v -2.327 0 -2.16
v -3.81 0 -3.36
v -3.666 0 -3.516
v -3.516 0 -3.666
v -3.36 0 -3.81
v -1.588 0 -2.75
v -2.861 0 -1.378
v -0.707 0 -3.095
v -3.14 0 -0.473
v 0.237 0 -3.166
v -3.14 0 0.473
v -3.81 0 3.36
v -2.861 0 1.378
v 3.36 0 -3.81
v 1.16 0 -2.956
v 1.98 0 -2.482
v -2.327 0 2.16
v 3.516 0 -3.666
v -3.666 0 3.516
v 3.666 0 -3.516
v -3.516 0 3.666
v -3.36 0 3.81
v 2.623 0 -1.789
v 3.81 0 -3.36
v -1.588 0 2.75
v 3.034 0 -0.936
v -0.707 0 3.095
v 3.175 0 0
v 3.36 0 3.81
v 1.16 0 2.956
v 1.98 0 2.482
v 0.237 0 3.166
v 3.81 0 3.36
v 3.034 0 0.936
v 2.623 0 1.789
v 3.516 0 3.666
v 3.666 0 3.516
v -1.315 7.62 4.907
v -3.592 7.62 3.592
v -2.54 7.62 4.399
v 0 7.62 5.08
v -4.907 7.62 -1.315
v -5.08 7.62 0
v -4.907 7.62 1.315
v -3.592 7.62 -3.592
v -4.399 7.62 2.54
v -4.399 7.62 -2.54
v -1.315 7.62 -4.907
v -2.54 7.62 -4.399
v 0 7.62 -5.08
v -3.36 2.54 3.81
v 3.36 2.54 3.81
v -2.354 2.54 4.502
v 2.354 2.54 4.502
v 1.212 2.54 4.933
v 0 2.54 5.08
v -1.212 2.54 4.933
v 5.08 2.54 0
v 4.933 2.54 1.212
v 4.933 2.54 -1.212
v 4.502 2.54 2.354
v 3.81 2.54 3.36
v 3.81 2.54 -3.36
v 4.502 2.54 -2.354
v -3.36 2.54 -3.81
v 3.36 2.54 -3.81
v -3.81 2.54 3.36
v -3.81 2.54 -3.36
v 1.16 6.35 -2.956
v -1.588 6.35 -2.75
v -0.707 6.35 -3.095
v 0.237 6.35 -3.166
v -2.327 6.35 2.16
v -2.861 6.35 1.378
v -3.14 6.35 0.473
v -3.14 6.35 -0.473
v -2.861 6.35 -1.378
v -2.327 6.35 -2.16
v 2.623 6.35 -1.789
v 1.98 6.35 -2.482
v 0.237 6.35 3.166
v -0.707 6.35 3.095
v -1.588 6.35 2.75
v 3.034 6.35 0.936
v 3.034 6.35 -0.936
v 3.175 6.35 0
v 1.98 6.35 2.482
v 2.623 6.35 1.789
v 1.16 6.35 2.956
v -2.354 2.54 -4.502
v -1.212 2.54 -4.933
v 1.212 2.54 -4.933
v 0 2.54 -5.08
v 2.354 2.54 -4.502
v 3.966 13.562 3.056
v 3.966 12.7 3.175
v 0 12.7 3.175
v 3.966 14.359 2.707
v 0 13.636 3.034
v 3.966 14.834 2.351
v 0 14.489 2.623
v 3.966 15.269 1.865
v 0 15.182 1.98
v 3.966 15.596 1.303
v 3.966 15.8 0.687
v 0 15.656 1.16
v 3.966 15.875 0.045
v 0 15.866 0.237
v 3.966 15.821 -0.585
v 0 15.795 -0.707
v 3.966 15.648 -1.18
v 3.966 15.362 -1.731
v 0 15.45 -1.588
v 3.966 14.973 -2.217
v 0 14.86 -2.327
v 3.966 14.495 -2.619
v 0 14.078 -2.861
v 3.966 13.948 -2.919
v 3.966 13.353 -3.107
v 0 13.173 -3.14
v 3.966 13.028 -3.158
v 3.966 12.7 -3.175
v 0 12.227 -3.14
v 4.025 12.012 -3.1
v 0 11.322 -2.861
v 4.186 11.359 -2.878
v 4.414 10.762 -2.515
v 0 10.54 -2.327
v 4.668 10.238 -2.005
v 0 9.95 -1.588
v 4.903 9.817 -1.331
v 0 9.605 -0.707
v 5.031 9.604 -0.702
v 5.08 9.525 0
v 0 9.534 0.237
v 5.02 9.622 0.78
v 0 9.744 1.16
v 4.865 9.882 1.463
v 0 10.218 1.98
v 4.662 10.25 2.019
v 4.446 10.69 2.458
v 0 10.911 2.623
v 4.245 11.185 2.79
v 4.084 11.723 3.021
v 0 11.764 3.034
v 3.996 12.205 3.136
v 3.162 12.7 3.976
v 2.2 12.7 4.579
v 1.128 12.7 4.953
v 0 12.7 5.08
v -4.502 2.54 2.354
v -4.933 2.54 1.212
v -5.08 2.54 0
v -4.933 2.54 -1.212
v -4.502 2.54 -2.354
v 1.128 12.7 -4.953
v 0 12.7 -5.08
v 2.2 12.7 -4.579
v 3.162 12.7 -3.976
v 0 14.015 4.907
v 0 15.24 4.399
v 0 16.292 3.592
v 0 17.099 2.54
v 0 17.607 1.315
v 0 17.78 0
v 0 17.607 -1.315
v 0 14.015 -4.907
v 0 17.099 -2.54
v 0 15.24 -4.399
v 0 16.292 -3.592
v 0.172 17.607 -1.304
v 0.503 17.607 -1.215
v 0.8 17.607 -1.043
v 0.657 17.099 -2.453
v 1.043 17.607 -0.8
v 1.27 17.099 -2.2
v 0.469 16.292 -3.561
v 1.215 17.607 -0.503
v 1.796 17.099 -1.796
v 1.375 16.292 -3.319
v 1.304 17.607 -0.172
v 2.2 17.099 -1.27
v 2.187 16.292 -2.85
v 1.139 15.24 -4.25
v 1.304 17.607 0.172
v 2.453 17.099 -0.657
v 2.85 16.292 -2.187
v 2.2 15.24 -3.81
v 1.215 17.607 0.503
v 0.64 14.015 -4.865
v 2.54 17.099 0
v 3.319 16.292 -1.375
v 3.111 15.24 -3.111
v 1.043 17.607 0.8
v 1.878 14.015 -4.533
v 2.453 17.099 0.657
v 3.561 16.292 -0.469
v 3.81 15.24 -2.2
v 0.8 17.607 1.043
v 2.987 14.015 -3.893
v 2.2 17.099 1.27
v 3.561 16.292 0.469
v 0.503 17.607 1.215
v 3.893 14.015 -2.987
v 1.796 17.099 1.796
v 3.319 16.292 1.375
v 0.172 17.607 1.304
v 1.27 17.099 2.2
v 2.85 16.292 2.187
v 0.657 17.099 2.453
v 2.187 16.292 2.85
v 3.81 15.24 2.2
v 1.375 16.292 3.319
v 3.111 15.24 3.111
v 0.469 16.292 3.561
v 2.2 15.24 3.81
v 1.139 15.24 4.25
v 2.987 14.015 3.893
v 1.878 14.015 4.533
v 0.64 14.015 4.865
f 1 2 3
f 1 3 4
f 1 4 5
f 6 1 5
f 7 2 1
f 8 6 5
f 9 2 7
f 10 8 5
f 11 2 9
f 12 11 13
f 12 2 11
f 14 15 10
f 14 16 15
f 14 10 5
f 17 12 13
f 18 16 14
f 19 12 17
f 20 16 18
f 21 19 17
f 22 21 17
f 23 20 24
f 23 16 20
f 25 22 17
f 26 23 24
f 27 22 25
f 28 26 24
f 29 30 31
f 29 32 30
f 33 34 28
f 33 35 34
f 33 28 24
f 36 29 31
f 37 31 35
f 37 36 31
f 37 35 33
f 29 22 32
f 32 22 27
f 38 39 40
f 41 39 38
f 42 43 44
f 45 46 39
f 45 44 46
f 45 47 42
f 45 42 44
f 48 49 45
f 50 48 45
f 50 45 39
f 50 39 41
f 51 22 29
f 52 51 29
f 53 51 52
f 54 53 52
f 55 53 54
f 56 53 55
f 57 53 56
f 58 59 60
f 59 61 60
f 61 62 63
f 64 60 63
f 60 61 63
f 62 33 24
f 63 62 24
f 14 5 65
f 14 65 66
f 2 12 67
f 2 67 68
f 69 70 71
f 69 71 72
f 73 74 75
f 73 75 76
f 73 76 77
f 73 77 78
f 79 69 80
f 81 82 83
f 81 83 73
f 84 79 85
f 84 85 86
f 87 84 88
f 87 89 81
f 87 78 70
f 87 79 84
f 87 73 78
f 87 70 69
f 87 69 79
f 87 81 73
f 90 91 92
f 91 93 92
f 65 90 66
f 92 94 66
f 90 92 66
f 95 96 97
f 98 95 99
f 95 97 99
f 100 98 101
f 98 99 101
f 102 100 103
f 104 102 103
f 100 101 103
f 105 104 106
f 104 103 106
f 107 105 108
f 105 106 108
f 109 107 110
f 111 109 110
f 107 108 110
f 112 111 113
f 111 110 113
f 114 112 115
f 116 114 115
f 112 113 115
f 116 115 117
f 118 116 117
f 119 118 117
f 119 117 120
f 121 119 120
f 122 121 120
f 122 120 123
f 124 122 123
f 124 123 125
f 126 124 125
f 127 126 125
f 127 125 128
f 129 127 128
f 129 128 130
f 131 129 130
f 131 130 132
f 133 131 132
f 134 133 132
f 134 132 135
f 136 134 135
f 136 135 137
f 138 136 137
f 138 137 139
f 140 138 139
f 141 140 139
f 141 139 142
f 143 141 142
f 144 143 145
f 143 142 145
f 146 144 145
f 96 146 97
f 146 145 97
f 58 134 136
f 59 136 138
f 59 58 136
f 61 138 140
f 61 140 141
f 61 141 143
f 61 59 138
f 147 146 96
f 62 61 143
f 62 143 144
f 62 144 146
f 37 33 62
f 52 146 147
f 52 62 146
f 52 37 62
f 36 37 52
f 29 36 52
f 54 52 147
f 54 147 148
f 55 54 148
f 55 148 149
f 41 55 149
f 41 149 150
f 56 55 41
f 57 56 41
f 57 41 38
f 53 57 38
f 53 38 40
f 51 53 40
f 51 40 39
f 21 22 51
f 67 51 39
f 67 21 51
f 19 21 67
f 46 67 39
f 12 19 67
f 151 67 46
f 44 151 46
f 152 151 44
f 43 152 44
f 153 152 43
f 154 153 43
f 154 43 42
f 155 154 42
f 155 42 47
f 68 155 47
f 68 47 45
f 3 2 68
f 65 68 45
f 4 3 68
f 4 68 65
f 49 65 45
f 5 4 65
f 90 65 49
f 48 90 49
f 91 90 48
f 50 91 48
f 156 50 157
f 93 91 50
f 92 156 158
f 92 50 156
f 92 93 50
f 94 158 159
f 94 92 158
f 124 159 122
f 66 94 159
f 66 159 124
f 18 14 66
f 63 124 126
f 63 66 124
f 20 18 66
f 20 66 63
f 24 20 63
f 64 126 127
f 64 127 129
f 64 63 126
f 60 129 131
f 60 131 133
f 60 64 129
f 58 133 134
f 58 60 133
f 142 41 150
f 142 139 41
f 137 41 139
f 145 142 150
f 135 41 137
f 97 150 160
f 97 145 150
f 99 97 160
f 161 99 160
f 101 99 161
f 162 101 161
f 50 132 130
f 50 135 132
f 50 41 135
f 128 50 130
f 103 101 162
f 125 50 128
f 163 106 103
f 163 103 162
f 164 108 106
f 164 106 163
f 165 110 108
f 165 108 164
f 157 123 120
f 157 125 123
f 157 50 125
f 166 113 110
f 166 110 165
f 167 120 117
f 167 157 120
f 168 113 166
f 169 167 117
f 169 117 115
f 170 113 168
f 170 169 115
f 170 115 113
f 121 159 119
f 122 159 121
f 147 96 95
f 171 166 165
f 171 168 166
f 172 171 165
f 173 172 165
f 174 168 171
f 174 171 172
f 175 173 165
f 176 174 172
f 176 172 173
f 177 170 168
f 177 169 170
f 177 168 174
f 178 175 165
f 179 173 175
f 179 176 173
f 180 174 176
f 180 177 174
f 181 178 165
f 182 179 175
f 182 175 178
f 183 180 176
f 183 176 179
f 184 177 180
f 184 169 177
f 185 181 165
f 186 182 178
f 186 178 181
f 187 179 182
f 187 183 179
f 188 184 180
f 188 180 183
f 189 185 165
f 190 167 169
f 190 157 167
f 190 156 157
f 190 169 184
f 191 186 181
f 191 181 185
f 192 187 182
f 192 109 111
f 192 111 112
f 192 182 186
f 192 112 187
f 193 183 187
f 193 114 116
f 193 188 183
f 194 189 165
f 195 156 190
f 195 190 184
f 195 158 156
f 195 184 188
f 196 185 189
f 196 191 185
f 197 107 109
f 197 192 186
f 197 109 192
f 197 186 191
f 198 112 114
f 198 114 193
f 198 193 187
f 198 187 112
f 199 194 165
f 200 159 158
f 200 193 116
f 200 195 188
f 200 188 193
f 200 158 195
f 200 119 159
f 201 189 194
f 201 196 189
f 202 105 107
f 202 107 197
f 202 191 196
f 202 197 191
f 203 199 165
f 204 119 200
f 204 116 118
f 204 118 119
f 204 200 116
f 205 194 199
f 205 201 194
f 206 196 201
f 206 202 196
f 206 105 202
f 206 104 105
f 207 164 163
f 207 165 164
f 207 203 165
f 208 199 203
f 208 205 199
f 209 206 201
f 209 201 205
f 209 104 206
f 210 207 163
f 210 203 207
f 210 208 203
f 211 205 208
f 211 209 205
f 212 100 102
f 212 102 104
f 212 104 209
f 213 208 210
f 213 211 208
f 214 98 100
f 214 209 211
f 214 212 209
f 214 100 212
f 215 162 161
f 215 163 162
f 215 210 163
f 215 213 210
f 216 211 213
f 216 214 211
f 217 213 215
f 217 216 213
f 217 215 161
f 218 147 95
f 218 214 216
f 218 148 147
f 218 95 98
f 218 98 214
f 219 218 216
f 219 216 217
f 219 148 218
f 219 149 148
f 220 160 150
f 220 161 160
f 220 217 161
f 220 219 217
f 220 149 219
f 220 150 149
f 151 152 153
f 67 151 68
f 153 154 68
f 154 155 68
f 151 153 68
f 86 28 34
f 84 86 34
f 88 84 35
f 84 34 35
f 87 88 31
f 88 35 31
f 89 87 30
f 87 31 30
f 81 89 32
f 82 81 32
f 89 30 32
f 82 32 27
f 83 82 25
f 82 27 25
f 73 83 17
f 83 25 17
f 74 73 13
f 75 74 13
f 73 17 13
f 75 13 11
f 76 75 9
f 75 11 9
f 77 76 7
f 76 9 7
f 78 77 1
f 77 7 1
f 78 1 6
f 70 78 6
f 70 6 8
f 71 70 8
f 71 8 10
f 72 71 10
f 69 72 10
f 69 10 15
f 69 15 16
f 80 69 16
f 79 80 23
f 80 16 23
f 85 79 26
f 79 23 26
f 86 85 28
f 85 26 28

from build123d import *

# Parameters (mm, degrees)
CUT_EXTRUDE1_DEPTH      = 20.176579466
CUT_EXTRUDE1_DEPTH_BACK = 20.176579466
SKETCH2_R               = 3.175
CUT_EXTRUDE2_DEPTH      = 6.35
SKETCH3_R               = 3.175
CUT_EXTRUDE3_DEPTH      = 20.176579466
SKETCH4_R               = 13.063866327
SKETCH4_W               = 7.62
SKETCH4_H               = 7.62
CUT_EXTRUDE4_DEPTH      = 2.54


with BuildPart() as part:
    # Sketch1 → Revolve1 (revolve)
    with BuildSketch(Plane.XY):
        with BuildLine():
            Line((-5.08, 0), (0, 0))
            Line((0, 0), (0, 17.78))
            ThreePointArc((0, 17.78), (-3.592102448, 16.292102448), (-5.08, 12.7))
            Line((-5.08, 12.7), (-5.08, 0))
        make_face()
    revolve(axis=Axis((0, 12.7, 0), (0, -1, 0)))

    # Sketch1<3> → Cut-Extrude1 (cut, two sides: drawn at the far end of the back side and taken through both)
    with BuildSketch(Plane.XY.offset(-CUT_EXTRUDE1_DEPTH_BACK)):
        with BuildLine():
            Line((-5.08, 12.7), (-5.08, 7.62))
            Line((-5.08, 7.62), (0, 7.62))
            Line((0, 7.62), (0, 12.7))
            Line((0, 12.7), (0, 17.78))
            ThreePointArc((0, 17.78), (-3.592102448, 16.292102448), (-5.08, 12.7))
        make_face()
    extrude(amount=CUT_EXTRUDE1_DEPTH + CUT_EXTRUDE1_DEPTH_BACK, mode=Mode.SUBTRACT)

    # Sketch2 → Cut-Extrude2 (cut)
    with BuildSketch(Plane.XZ):
        Circle(SKETCH2_R)
    extrude(amount=-CUT_EXTRUDE2_DEPTH, mode=Mode.SUBTRACT)

    # Sketch3 → Cut-Extrude3 (cut, through all)
    with BuildSketch(Plane.ZY):
        with Locations((0, 12.7)):
            Circle(SKETCH3_R)
    extrude(amount=-CUT_EXTRUDE3_DEPTH, mode=Mode.SUBTRACT)

    # Sketch4 → Cut-Extrude4 (cut)
    with BuildSketch(Plane(origin=(0, 0, 0), x_dir=(1, 0, 0), z_dir=(0, 1, 0))):
        Circle(SKETCH4_R)
        Rectangle(SKETCH4_W, SKETCH4_H, mode=Mode.SUBTRACT)
    extrude(amount=CUT_EXTRUDE4_DEPTH, mode=Mode.SUBTRACT)


solid = part.part
